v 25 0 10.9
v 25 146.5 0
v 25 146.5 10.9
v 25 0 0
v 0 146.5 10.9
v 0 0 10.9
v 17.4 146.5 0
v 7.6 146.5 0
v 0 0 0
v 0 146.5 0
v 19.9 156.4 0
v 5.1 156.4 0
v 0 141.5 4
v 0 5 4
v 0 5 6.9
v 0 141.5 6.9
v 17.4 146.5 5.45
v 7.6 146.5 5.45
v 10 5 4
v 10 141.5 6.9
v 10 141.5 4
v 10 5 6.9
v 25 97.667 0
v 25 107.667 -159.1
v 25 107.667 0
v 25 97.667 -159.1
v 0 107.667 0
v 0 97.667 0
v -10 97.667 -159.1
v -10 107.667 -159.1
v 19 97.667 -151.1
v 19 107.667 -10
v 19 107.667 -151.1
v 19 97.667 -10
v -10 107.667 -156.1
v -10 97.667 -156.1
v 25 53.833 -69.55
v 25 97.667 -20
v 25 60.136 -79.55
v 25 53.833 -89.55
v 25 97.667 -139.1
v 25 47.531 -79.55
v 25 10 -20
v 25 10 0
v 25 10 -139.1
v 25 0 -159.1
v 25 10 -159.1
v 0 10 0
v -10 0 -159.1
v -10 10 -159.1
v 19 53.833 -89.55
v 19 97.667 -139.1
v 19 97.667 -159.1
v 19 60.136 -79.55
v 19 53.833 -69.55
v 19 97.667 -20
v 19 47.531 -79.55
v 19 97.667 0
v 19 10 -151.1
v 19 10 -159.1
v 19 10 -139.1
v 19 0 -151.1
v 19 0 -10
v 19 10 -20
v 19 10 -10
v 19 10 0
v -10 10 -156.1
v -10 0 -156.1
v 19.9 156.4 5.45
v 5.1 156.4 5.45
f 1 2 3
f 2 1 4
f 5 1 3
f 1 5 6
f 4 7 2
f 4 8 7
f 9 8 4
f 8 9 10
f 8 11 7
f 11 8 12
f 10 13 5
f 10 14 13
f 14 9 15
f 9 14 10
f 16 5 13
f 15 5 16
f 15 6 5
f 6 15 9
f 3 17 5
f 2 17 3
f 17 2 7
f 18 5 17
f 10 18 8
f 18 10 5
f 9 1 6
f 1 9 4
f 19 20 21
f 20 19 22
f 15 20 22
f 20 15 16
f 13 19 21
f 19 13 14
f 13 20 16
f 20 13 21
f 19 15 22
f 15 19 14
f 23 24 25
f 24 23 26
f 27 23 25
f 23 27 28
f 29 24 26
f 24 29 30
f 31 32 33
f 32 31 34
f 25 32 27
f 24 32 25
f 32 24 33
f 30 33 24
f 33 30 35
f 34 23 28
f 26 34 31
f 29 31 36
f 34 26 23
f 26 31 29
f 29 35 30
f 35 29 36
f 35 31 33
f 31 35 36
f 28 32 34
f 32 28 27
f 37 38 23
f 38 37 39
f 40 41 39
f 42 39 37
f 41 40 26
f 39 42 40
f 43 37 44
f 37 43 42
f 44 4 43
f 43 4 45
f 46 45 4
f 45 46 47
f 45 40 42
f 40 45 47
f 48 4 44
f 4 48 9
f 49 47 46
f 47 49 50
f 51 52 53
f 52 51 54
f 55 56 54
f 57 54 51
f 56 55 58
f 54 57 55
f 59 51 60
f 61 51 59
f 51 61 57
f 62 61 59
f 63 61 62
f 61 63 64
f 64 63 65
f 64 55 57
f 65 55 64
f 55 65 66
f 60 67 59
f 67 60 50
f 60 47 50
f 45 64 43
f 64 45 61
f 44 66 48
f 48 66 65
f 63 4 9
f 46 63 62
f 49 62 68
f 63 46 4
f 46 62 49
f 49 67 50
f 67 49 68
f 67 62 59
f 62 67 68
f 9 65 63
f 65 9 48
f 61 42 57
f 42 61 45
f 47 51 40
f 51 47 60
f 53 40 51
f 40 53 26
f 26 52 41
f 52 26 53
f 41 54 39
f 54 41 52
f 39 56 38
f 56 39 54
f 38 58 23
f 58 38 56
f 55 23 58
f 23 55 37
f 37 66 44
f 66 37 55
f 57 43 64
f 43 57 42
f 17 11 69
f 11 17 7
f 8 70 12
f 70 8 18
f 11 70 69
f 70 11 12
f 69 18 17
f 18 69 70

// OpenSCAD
BOARD_HEIGHT = 2.9;
BOARD_DEPTH = 136.5;
INCUT_WIDTH = 10;


DEPTH_BUFFER = 5;
HEIGHT_LOWER_BUFFER = 4;
HEIGHT_UPPER_BUFFER = 4;

TOP_WIDTH = 25;

TOTAL_HEIGHT = 170;
FOOT_DEPTH = 10;
LEG_WIDTH = 6;
FOOT_WIDTH = 35;
FOOT_HEIGHT = 3;
FOOT_TRIANGLE_SIDE = 5;

TOTAL_TOP_HEIGHT = BOARD_HEIGHT + HEIGHT_LOWER_BUFFER + HEIGHT_UPPER_BUFFER;
TOTAL_TOP_DEPTH = BOARD_DEPTH + 2*DEPTH_BUFFER;

LEG_HEIGHT = TOTAL_HEIGHT - BOARD_HEIGHT - HEIGHT_LOWER_BUFFER - HEIGHT_UPPER_BUFFER;

module top_section() {
    difference() {
        cube([TOP_WIDTH, TOTAL_TOP_DEPTH, TOTAL_TOP_HEIGHT]);
        translate([0, DEPTH_BUFFER, HEIGHT_LOWER_BUFFER]) {
            cube([INCUT_WIDTH, BOARD_DEPTH, BOARD_HEIGHT]);
        }
    }
}

module foot(depth_offset) {
    foot_width = FOOT_WIDTH - LEG_WIDTH;
    translate([TOP_WIDTH - LEG_WIDTH, depth_offset, -LEG_HEIGHT]) {
        union() {
            cube([LEG_WIDTH, FOOT_DEPTH, LEG_HEIGHT]);
            translate([-foot_width, 0, 0]) {
                cube([foot_width, FOOT_DEPTH, FOOT_HEIGHT]);
            }
            translate([0, FOOT_DEPTH, FOOT_HEIGHT]) {
                rotate([90, 0, 0]) {
                    linear_extrude(height=FOOT_DEPTH) {
                        polygon([[0, 0], [-foot_width, 0], [0,FOOT_TRIANGLE_SIDE]]);
                    }
                }
            }
            
            translate([0, FOOT_DEPTH, TOTAL_HEIGHT-TOTAL_TOP_HEIGHT]) {
                rotate([90, 0, 0]) {
                    linear_extrude(height=FOOT_DEPTH) {
                        polygon([[0, 0], [-(TOP_WIDTH - LEG_WIDTH), 0], [0,-10]]);
                    }
                }
            }
        }
    }
}

module connector_female() {
    connector_depth = 15;
    incut_depth = 10;
    color("pink") {
        translate([0, -connector_depth, 0]) {
            difference() {
                cube([TOP_WIDTH, connector_depth, TOTAL_TOP_HEIGHT]);
                linear_extrude(height=TOTAL_TOP_HEIGHT / 2) {
                    polygon([
                        [.3*TOP_WIDTH, 0],
                        [.2*TOP_WIDTH, incut_depth],
                        [(1-.2)*TOP_WIDTH, incut_depth],
                        [(1-.3)*TOP_WIDTH, 0]
                    ]);
                }
            }
        }
    }
}

module connector_male() {
    connector_depth = 15;
    incut_depth = 10;
    color("blue") {
        translate([0, TOTAL_TOP_DEPTH, 0]) {
            linear_extrude(height=TOTAL_TOP_HEIGHT / 2) {
                polygon([
                    [.3*TOP_WIDTH+.1, 0],
                    [.2*TOP_WIDTH+.1, incut_depth-.1],
                    [(1-.2)*TOP_WIDTH-.1, incut_depth-.1],
                    [(1-.3)*TOP_WIDTH-.1, 0]
                ]);
            }
        }
    }
}


module struts(shallow_foot, deep_foot, strut_width) {
    inner_depth = shallow_foot + FOOT_DEPTH;
    outer_depth = deep_foot;
    
    min_height = -LEG_HEIGHT;
    max_height = 0;
    
    first_strut_points = [
        // First diagonal (bottom-left to top-right)
        [min_height, inner_depth],
        [min_height+ strut_width, inner_depth],
        [max_height, outer_depth],
        [max_height-strut_width, outer_depth],
    ];
    
    second_strut_points = [
        [min_height, outer_depth],
        [min_height+ strut_width, outer_depth],
        [max_height, inner_depth],
        [max_height-strut_width, inner_depth],
    ];
    
    // Create the X shape by rotating and extruding
    translate([TOP_WIDTH - LEG_WIDTH, 0, -LEG_HEIGHT]) {
        rotate([0, 90, 0]) {
            linear_extrude(height = LEG_WIDTH) {
                // First diagonal
                polygon(first_strut_points);
                polygon(second_strut_points);
            }
        }
    }
}        
    



//mirror([1, 0, 0]) {

    // MALE RIGHT
    top_section();
    foot(TOTAL_TOP_DEPTH*2/3);
    foot(0);
    struts(0, TOTAL_TOP_DEPTH*2/3, 20);
    connector_male();


    // FEMALE RIGHT
//    top_section();
//    foot(TOTAL_TOP_DEPTH*1/3 -FOOT_DEPTH);
//    foot(TOTAL_TOP_DEPTH-FOOT_DEPTH);
//    struts(TOTAL_TOP_DEPTH*1/3 -FOOT_DEPTH, TOTAL_TOP_DEPTH-FOOT_DEPTH, 20);
//    connector_female();

//}
